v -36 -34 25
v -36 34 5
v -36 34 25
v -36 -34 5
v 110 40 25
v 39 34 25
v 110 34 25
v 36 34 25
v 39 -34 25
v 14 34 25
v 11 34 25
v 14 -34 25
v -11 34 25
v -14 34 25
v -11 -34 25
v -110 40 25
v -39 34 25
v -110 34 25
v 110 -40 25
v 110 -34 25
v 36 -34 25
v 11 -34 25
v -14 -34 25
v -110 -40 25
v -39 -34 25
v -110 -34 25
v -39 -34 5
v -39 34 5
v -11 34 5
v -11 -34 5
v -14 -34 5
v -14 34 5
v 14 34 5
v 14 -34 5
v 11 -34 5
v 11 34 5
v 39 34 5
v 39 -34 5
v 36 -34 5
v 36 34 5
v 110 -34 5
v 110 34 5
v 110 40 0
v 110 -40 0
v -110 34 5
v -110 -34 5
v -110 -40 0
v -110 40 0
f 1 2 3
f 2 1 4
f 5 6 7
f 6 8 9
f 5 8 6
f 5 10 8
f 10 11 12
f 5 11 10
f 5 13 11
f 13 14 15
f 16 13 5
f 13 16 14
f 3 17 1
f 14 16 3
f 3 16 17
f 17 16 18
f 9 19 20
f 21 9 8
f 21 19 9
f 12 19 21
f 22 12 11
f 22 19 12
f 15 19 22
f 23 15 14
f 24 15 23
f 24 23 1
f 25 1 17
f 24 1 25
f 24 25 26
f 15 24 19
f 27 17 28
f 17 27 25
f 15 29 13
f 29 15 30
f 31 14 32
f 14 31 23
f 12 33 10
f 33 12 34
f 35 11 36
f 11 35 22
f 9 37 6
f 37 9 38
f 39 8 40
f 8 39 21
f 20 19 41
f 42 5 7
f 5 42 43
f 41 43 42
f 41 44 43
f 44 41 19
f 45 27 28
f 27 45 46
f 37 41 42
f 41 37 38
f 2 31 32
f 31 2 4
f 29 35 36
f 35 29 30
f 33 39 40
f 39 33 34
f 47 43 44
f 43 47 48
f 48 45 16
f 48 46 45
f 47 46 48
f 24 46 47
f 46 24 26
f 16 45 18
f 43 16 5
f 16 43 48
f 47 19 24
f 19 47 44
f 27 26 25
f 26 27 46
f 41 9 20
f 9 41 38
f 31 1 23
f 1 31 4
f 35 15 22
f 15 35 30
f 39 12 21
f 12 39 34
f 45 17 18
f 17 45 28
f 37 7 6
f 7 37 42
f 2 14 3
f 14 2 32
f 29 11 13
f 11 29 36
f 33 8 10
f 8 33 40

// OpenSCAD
$fn = 32;

// ----------------------------------------------------------------------
// Rib frame 220 x 80 x 25
// 4 ribs at 25 mm pitch
// ----------------------------------------------------------------------

// --- parameters (mm) ---
frame = [220, 80, 5];  // base plate size (x, y, z)
rail_w = 6;            // side rail width
ribs = 4;              // number of ribs
rib_t = 3;             // rib thickness
rib_h = 20;            // rib height above the base plate
pitch = 25;            // pitch between rib centres

// --- derived feature positions (mm) ---
span = (ribs - 1) * pitch;          // = 75   distance between the outer ribs
origin_x = -span / 2;               // = -37.5   X of the first rib
rib_len = frame[1] - 2 * rail_w + 2;  // = 70   rib length, 1 mm into each rail
feature_centers = [
  [origin_x + 0 * pitch, 0],
  [origin_x + 1 * pitch, 0],
  [origin_x + 2 * pitch, 0],
  [origin_x + 3 * pitch, 0]
];   // rib centre line, drives the rib loop

// base plate, two side rails, then the ribs read straight off feature_centers
union() {
  translate([-frame[0] / 2, -frame[1] / 2, 0]) cube(frame);
  translate([-frame[0] / 2, -frame[1] / 2, 0]) cube([frame[0], rail_w, frame[2] + rib_h]);
  translate([-frame[0] / 2, frame[1] / 2 - rail_w, 0]) cube([frame[0], rail_w, frame[2] + rib_h]);
  for (centre = feature_centers)
    translate([centre[0] - rib_t / 2, centre[1] - rib_len / 2, frame[2] - 1])
      cube([rib_t, rib_len, rib_h + 1]);
}
